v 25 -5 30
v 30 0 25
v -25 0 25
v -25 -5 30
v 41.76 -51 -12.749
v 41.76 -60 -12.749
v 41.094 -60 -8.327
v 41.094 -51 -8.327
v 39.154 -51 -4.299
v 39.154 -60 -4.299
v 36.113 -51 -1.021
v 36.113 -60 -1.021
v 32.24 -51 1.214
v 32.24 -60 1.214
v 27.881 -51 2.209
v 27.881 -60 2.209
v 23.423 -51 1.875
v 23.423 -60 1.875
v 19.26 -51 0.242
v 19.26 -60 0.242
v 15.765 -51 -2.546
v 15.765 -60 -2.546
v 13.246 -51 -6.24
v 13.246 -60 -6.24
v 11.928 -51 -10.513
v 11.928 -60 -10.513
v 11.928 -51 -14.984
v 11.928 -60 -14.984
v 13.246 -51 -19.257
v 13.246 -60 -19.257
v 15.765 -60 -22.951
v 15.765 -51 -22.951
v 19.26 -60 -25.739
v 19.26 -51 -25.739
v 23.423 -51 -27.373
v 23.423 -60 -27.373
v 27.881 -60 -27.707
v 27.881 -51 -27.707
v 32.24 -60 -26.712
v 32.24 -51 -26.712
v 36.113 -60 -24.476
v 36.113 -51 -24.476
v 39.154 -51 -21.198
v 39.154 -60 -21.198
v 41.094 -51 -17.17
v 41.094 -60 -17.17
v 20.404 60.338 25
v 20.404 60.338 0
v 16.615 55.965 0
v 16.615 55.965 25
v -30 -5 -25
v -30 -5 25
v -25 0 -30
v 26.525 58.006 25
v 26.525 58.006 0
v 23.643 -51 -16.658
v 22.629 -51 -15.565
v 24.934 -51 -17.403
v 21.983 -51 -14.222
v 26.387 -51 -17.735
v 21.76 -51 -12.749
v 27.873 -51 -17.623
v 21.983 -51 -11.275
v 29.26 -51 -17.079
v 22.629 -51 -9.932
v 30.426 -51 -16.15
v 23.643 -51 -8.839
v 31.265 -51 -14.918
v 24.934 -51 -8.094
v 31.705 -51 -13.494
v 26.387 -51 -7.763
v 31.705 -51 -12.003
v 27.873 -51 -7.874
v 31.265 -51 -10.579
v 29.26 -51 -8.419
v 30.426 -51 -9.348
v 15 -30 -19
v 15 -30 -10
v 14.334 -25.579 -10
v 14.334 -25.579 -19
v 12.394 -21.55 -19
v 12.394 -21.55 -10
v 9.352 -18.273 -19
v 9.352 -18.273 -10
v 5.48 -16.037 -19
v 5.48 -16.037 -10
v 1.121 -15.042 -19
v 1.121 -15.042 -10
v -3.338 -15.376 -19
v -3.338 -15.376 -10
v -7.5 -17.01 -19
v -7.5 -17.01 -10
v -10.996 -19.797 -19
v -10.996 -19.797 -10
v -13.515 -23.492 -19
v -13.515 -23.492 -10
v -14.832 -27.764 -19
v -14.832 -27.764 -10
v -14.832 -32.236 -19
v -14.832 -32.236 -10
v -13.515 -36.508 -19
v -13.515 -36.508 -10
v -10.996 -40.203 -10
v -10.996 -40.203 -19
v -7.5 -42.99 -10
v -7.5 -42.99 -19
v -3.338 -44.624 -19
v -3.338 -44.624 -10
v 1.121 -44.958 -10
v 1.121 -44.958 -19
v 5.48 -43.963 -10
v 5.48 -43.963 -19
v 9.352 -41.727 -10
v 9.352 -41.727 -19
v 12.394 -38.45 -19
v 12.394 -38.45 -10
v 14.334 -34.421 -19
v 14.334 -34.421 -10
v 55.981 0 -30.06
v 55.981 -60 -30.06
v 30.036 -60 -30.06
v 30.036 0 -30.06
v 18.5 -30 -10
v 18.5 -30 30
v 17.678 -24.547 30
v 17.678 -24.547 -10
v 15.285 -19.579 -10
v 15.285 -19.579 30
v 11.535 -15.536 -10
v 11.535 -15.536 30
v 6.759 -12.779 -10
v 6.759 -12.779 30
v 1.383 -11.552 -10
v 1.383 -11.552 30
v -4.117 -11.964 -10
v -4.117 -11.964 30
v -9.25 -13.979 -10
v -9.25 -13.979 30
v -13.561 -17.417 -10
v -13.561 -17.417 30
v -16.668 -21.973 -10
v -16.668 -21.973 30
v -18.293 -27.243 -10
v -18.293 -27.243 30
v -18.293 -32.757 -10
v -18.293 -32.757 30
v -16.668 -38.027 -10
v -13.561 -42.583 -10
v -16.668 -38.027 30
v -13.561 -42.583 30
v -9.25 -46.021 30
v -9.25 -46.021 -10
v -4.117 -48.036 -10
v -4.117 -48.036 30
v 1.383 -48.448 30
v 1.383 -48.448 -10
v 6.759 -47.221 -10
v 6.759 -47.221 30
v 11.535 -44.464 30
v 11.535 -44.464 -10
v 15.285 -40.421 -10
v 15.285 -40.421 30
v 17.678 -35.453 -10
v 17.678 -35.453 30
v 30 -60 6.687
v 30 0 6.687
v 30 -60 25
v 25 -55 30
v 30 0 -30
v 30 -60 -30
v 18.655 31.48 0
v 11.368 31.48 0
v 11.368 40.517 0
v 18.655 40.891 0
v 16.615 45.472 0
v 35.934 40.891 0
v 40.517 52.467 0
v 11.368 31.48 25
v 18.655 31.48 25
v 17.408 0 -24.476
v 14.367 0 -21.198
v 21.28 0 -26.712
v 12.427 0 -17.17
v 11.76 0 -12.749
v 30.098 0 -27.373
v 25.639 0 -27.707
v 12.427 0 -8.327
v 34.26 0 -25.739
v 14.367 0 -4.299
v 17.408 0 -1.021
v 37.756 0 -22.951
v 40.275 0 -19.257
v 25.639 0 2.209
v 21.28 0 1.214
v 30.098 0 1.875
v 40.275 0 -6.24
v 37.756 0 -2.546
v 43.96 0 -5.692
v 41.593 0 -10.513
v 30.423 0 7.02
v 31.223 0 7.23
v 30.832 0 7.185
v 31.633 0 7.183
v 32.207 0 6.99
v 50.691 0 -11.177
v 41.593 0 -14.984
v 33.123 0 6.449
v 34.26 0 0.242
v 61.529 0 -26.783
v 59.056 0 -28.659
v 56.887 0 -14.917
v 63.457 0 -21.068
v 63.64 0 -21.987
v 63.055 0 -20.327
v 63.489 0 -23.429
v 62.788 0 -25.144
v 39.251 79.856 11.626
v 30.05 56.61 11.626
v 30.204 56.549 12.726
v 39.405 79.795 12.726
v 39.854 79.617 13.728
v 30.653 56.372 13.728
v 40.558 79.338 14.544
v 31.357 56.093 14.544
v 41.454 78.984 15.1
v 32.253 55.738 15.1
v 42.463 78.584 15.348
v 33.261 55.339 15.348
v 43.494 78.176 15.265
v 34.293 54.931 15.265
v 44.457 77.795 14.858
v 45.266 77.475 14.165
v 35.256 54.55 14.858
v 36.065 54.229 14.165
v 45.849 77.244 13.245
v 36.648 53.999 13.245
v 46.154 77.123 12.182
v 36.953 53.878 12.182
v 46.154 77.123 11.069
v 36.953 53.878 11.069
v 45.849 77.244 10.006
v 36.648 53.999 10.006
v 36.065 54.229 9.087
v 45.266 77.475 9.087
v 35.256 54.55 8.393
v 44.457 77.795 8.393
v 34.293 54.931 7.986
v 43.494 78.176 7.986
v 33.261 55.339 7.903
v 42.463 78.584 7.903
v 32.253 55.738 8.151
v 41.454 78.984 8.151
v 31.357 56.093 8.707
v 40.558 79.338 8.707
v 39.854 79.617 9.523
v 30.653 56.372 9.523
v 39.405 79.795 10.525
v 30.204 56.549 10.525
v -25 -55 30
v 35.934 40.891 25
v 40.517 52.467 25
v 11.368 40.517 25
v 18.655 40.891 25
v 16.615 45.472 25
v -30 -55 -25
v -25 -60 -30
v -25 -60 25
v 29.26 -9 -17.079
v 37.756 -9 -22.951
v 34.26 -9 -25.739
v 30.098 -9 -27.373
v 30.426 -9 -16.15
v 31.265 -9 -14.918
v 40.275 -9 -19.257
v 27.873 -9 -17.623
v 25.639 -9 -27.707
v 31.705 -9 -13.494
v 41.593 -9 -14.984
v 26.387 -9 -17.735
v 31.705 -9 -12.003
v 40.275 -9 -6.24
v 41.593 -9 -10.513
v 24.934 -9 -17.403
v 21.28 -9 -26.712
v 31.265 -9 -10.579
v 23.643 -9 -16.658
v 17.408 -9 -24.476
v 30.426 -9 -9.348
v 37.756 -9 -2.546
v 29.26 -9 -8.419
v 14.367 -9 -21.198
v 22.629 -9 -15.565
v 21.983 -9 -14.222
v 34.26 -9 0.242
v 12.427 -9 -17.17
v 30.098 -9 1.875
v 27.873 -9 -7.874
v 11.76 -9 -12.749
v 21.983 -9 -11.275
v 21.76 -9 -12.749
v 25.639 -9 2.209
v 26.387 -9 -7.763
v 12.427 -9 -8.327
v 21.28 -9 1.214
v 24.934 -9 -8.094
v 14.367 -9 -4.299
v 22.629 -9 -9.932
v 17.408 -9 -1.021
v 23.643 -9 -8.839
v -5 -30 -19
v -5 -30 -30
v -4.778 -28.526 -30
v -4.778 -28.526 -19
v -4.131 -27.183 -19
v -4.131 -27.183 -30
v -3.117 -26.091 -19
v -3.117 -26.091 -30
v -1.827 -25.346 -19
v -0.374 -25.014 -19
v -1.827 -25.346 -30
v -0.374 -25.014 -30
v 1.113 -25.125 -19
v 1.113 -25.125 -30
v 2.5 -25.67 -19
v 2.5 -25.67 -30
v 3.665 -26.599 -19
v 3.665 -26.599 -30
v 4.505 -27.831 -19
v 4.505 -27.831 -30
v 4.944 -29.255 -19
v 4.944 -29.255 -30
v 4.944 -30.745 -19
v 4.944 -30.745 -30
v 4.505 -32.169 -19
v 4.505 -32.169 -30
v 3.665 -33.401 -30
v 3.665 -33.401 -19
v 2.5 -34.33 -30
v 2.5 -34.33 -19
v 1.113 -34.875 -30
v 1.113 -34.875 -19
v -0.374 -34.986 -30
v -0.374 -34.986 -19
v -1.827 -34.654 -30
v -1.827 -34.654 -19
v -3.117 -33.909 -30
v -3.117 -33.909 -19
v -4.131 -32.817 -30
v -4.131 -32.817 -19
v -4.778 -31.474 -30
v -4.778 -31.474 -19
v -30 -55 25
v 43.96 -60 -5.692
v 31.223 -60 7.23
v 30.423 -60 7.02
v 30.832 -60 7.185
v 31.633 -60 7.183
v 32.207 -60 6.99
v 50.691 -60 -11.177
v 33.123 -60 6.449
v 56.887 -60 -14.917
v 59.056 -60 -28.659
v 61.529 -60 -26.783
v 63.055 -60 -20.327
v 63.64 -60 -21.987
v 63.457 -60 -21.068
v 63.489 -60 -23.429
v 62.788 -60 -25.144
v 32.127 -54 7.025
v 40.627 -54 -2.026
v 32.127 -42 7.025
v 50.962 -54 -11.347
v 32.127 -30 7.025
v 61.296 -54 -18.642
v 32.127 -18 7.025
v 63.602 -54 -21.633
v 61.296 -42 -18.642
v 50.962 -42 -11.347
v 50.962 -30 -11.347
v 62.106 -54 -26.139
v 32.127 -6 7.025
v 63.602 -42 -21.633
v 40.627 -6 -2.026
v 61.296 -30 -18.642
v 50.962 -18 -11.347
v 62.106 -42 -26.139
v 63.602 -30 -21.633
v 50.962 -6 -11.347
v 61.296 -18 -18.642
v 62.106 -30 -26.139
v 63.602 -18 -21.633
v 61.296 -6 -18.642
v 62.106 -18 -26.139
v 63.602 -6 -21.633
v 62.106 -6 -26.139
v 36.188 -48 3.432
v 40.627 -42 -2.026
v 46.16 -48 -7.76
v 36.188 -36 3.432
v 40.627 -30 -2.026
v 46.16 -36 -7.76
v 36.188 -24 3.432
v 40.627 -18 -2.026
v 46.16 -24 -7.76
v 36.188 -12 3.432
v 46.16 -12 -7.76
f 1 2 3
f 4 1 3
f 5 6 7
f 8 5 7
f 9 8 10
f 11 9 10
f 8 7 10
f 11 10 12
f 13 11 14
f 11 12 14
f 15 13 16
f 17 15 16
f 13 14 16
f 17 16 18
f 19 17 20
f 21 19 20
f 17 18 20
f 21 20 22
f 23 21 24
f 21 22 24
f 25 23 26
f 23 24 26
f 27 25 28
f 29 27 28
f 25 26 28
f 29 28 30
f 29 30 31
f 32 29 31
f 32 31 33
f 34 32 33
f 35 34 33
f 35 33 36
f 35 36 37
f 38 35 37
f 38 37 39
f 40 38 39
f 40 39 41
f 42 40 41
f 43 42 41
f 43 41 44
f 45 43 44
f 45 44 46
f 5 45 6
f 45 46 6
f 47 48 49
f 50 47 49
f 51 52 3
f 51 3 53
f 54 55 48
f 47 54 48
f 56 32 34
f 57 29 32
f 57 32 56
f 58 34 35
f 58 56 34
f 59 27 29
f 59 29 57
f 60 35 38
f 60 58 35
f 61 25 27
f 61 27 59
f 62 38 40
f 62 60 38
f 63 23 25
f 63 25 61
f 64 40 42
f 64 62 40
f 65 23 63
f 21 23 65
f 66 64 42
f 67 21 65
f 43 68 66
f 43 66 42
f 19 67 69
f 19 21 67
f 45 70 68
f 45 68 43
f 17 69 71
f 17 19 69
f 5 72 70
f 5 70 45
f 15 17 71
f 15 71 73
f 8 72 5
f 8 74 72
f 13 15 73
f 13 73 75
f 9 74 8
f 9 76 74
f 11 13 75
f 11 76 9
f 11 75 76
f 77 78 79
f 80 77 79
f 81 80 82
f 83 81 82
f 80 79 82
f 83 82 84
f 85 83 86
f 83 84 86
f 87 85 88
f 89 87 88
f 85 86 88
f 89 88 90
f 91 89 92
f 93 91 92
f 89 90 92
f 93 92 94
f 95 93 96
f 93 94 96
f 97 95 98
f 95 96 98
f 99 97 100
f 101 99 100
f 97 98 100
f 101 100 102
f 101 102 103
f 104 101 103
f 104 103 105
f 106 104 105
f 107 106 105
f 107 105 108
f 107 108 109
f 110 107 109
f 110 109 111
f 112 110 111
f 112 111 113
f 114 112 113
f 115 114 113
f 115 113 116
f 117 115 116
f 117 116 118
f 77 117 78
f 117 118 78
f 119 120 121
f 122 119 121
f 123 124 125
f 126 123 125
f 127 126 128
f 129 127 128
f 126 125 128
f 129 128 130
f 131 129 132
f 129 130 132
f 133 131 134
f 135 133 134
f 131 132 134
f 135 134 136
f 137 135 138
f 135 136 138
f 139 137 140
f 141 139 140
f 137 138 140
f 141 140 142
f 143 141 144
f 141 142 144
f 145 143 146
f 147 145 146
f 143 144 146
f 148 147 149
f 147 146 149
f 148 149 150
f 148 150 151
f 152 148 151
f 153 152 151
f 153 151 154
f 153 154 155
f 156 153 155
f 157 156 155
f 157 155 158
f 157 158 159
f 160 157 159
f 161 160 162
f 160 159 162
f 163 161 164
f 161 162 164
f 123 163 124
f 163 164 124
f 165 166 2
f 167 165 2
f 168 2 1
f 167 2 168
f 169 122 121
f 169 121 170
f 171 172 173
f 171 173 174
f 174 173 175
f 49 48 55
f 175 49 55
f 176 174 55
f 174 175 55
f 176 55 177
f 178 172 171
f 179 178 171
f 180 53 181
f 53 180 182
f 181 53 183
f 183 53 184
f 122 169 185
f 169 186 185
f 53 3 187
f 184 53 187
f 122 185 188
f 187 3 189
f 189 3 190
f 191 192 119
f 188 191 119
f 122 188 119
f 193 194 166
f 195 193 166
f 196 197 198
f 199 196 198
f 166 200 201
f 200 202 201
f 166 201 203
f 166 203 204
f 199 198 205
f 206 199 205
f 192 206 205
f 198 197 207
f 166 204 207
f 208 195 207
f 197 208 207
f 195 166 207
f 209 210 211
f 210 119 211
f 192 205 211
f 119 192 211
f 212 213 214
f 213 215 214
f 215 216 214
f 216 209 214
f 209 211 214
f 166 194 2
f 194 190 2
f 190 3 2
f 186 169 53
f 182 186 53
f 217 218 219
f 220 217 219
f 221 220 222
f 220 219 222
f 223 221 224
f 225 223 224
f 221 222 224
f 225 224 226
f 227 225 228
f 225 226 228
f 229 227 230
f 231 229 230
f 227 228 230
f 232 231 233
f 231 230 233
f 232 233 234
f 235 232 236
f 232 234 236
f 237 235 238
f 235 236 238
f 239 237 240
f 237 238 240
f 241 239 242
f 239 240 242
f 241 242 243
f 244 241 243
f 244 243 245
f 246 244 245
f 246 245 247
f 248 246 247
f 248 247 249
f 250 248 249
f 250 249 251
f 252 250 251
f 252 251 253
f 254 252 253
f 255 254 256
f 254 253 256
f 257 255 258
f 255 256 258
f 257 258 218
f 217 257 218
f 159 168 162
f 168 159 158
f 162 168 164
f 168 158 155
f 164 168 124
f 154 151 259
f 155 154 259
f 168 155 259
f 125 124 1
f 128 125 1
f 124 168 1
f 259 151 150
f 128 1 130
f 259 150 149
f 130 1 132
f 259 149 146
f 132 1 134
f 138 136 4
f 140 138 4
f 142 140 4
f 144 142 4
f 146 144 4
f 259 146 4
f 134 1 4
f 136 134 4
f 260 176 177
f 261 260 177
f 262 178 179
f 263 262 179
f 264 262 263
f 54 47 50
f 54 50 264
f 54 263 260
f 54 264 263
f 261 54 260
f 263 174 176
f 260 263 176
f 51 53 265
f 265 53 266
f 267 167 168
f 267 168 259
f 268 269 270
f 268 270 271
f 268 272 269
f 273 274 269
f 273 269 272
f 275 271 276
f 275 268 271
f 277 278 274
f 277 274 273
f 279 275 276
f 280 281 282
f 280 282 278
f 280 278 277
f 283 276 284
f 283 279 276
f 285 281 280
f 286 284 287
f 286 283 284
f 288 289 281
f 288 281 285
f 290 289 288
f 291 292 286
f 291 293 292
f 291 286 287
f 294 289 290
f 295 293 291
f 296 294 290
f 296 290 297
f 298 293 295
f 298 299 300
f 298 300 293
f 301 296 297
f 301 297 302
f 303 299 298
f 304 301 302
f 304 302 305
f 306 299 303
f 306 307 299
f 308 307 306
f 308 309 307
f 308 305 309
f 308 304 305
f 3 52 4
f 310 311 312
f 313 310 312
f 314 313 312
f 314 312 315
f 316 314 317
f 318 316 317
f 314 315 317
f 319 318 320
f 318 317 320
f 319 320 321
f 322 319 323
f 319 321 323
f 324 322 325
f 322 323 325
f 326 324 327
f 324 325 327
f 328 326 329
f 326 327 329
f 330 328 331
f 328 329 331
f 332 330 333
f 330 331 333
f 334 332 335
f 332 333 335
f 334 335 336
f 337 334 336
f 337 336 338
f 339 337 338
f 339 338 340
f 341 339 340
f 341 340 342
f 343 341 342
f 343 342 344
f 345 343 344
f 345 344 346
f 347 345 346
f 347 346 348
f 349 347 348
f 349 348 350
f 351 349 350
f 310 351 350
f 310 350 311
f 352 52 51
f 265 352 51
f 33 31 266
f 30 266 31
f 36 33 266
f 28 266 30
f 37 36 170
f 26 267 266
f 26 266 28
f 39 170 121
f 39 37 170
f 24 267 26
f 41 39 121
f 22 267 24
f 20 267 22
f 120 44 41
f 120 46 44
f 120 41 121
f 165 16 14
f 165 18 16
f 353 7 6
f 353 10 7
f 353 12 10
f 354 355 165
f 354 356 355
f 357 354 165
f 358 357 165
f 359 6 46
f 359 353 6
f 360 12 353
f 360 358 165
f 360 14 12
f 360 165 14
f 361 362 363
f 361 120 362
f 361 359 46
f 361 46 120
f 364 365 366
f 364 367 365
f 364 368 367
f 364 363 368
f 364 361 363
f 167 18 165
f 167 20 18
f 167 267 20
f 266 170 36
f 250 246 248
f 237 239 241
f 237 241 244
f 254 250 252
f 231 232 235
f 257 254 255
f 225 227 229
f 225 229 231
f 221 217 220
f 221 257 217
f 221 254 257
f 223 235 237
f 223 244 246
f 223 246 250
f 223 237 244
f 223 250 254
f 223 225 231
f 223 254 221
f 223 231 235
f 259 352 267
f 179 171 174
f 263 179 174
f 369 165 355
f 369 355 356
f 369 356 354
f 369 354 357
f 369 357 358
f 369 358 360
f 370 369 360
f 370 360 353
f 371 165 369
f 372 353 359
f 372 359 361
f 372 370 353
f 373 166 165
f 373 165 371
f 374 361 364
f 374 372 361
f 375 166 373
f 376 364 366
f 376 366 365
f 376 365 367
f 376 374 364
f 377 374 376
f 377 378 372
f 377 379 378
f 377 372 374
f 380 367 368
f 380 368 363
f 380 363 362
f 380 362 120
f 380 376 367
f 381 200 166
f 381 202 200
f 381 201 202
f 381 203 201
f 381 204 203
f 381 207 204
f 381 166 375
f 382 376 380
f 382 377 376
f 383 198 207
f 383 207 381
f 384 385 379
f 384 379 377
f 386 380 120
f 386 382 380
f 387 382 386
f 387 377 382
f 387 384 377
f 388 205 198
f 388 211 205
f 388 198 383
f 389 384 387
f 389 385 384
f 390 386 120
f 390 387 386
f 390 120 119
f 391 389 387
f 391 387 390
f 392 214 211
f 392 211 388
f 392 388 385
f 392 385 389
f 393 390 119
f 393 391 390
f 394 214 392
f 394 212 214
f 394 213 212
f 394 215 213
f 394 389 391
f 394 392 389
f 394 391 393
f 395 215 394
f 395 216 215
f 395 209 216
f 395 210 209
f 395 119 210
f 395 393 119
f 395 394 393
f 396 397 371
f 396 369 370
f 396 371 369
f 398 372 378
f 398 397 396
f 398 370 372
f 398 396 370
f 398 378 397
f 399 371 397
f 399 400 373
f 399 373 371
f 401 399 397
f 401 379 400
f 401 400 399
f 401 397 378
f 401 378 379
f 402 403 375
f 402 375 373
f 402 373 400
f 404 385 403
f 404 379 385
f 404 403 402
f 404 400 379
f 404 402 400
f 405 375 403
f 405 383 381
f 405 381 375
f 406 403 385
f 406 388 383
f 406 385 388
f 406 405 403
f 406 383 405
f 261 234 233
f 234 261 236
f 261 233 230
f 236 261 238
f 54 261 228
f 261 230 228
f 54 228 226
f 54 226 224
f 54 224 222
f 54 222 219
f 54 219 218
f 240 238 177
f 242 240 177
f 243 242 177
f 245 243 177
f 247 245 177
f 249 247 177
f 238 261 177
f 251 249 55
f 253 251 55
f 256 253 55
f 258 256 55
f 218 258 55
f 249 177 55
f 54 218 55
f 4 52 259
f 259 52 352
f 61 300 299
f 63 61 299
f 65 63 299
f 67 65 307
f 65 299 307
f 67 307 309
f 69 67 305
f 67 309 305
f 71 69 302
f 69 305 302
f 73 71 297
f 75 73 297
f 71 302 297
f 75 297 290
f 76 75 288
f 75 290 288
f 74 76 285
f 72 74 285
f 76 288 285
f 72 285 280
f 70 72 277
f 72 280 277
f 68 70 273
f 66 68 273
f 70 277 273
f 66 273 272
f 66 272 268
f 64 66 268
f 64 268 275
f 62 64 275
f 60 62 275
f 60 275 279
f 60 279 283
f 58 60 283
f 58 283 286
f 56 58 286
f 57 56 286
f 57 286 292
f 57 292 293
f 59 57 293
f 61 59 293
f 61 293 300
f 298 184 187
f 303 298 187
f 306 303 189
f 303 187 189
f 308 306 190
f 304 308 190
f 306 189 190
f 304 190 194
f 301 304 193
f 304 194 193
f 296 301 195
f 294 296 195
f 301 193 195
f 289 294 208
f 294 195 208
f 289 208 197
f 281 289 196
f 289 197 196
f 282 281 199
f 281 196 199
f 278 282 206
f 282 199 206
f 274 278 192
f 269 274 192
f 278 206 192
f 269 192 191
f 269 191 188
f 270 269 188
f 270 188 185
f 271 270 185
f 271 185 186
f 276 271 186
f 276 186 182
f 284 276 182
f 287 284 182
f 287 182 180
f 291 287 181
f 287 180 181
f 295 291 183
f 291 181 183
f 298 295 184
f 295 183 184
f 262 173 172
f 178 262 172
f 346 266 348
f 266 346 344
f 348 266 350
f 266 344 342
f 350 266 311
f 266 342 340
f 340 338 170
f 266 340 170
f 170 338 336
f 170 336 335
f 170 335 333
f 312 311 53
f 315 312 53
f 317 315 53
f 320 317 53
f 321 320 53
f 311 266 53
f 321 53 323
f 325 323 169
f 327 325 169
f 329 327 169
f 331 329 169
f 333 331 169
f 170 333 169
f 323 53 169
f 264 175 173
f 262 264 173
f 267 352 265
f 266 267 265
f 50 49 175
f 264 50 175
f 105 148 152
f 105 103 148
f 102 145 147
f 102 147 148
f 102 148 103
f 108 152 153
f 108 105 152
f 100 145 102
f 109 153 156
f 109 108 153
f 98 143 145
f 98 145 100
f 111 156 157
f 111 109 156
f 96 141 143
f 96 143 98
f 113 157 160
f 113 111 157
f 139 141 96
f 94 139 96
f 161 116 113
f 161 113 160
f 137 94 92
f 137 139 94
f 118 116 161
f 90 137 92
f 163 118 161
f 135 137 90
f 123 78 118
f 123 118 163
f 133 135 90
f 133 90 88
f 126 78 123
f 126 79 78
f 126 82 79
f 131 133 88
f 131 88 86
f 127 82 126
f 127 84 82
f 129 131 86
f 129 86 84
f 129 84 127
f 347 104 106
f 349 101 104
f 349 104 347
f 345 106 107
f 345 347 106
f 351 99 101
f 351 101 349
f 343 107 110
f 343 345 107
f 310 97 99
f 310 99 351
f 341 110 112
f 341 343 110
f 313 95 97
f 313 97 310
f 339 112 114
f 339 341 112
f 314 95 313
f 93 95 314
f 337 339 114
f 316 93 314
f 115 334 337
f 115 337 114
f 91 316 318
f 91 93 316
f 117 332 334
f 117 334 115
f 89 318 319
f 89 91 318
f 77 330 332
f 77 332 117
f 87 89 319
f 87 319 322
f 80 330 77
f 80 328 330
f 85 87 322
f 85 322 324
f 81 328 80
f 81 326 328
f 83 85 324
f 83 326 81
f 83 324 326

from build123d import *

# Parameters (mm, degrees)
F1_DEPTH  = 60
F2_R      = 18.5
F3_DEPTH  = 40
F4_R      = 15
F5_DEPTH  = 9
F7_D      = 10
F8_R      = 15
F9_DEPTH  = 9
F11_D     = 10
F12_R     = 15
F12_R_2   = 5
F13_DEPTH = 9
F14_SIZE  = 5
F17_DEPTH = 80
F19_DEPTH = 25
F20_R     = 3.7328350118
F21_DEPTH = 25


with BuildPart() as f1:
    # F0 (on Front) → F1 (new body)
    with BuildSketch(Plane.XZ):
        with BuildLine():
            Line((30, 30), (-30, 30))
            Line((-30, 30), (-30, -30))
            Line((-30, -30), (30, -30))
            add(Edge.make_bspline(
                [(30, -30), (27.2898716013, -25.4320075528), (26.0725810609, 2.6429015128), (30, 6.686813198)],
                knots=[0.8212569267, 0.8212569267, 0.8212569267, 0.8212569267, 1, 1, 1, 1], degree=3))
            Line((30, 6.686813198), (30, 30))
        make_face()
        with BuildLine():
            add(Edge.make_bspline(
                [(30, 6.686813198), (32.4037424964, 9.1618540633), (41.092931908, -3.9330331363), (50.3666891959, -11.4125300307), (56.4413019982, -14.1647728527), (61.1492245568, -18.6387644358), (64.2853794844, -20.9965734386), (62.7521105432, -27.2245264469), (52.9976727052, -31.9484525445), (42.2676536377, -30.6092327314), (33.2032888673, -29.6631638006), (30.7690199989, -31.2962033638), (30, -30)],
                knots=[0, 0, 0, 0, 0.1093981385, 0.2194869914, 0.2939063262, 0.3681551135, 0.4229735158, 0.4893932118, 0.582994329, 0.6824101474, 0.7705371903, 0.8212569267, 0.8212569267, 0.8212569267, 0.8212569267], degree=3))
            Line((30, 6.686813198), (30, -30))
        make_face()
        with BuildLine():
            Line((30, -30), (30, 6.686813198))
            add(Edge.make_bspline(
                [(30, -30), (27.2898716013, -25.4320075528), (26.0725810609, 2.6429015128), (30, 6.686813198)],
                knots=[0.8212569267, 0.8212569267, 0.8212569267, 0.8212569267, 1, 1, 1, 1], degree=3))
        make_face()
    extrude(amount=F1_DEPTH)

    # F2 (on face) → F3 (cut)
    with BuildSketch(Plane.XY.offset(30)):
        with Locations((0, -30)):
            Circle(F2_R)
    extrude(amount=-F3_DEPTH, mode=Mode.SUBTRACT)

    # F4 (on face) → F5 (cut)
    with BuildSketch(Plane.XY.offset(-10)):
        with Locations((0, -30)):
            Circle(F4_R)
    extrude(amount=-F5_DEPTH, mode=Mode.SUBTRACT)

    # F7 (through all)
    with Locations(Plane.XY.offset(-19)):
        with Locations((0, -30)):
            Hole(F7_D / 2)

    # F8 (on face) → F9 (cut)
    with BuildSketch(Plane.XZ.offset(60)):
        with Locations((26.7603733739, -12.748638168)):
            Circle(F8_R)
    extrude(amount=-F9_DEPTH, mode=Mode.SUBTRACT)

    # F11 (through all)
    with Locations(Plane.XZ.offset(51)):
        with Locations((26.7603733739, -12.748638168)):
            Hole(F11_D / 2)

    # F12 (on face) → F13 (cut)
    with BuildSketch(Plane(origin=(0, 0, 0), x_dir=(-1, 0, 0), z_dir=(0, 1, 0))):
        with Locations((-26.7603733739, -12.748638168)):
            Circle(F12_R)
        with Locations((-26.7603733739, -12.748638168)):
            Circle(F12_R_2, mode=Mode.SUBTRACT)
    extrude(amount=-F13_DEPTH, mode=Mode.SUBTRACT)

    # F14
    f14_edges = [f1.edges().sort_by_distance(p)[0] for p in [
        (-30, -30, 30),
        (-30, -30, -30),
        (-30, 0, 0),
        (-30, -60, 0),
        (0, 0, 30),
        (0, -60, 30),
        (30, -30, 30),
    ]]
    chamfer(f14_edges, length=F14_SIZE)

    # F16 (on face) → F17 (cut)
    with BuildSketch(Plane.XZ.offset(60)):
        Polygon((56.1993345618, -30.0596710294), (23.1289360672, -30.0596710294), (49.712177366, -33.5852988064), align=None)
    extrude(amount=-F17_DEPTH, mode=Mode.SUBTRACT)


with BuildPart() as f19:
    # F18 (on Top) → F19 (new body)
    with BuildSketch(Plane.XY):
        Polygon((40.5165106058, 52.4674206972), (26.525195688, 58.0056495965), (20.4039979726, 60.337536037), (16.6146829724, 55.9652484953), (16.6146829724, 45.471765101), (11.3679412752, 40.5165106058), (11.3679412752, 31.4804539084), (18.6550822109, 31.4804539084), (18.6550822109, 40.8911202074), (27.1081682295, 40.8911202074), (30.6059960276, 40.8911202074), (35.9342249311, 40.8911202074), align=None)
    extrude(amount=F19_DEPTH)

    # F20 (on face) → F21 (join)
    with BuildSketch(Plane(origin=(23.4434329635, 59.2255140253, 0), x_dir=(-0.9298066113, 0.3680484555, 0), z_dir=(0.3680484555, 0.9298066113, 0))):
        with Locations((-10.8381894265, 11.6255441681)):
            Circle(F20_R)
    extrude(amount=F21_DEPTH)


solid = Compound([f1.part, f19.part])
